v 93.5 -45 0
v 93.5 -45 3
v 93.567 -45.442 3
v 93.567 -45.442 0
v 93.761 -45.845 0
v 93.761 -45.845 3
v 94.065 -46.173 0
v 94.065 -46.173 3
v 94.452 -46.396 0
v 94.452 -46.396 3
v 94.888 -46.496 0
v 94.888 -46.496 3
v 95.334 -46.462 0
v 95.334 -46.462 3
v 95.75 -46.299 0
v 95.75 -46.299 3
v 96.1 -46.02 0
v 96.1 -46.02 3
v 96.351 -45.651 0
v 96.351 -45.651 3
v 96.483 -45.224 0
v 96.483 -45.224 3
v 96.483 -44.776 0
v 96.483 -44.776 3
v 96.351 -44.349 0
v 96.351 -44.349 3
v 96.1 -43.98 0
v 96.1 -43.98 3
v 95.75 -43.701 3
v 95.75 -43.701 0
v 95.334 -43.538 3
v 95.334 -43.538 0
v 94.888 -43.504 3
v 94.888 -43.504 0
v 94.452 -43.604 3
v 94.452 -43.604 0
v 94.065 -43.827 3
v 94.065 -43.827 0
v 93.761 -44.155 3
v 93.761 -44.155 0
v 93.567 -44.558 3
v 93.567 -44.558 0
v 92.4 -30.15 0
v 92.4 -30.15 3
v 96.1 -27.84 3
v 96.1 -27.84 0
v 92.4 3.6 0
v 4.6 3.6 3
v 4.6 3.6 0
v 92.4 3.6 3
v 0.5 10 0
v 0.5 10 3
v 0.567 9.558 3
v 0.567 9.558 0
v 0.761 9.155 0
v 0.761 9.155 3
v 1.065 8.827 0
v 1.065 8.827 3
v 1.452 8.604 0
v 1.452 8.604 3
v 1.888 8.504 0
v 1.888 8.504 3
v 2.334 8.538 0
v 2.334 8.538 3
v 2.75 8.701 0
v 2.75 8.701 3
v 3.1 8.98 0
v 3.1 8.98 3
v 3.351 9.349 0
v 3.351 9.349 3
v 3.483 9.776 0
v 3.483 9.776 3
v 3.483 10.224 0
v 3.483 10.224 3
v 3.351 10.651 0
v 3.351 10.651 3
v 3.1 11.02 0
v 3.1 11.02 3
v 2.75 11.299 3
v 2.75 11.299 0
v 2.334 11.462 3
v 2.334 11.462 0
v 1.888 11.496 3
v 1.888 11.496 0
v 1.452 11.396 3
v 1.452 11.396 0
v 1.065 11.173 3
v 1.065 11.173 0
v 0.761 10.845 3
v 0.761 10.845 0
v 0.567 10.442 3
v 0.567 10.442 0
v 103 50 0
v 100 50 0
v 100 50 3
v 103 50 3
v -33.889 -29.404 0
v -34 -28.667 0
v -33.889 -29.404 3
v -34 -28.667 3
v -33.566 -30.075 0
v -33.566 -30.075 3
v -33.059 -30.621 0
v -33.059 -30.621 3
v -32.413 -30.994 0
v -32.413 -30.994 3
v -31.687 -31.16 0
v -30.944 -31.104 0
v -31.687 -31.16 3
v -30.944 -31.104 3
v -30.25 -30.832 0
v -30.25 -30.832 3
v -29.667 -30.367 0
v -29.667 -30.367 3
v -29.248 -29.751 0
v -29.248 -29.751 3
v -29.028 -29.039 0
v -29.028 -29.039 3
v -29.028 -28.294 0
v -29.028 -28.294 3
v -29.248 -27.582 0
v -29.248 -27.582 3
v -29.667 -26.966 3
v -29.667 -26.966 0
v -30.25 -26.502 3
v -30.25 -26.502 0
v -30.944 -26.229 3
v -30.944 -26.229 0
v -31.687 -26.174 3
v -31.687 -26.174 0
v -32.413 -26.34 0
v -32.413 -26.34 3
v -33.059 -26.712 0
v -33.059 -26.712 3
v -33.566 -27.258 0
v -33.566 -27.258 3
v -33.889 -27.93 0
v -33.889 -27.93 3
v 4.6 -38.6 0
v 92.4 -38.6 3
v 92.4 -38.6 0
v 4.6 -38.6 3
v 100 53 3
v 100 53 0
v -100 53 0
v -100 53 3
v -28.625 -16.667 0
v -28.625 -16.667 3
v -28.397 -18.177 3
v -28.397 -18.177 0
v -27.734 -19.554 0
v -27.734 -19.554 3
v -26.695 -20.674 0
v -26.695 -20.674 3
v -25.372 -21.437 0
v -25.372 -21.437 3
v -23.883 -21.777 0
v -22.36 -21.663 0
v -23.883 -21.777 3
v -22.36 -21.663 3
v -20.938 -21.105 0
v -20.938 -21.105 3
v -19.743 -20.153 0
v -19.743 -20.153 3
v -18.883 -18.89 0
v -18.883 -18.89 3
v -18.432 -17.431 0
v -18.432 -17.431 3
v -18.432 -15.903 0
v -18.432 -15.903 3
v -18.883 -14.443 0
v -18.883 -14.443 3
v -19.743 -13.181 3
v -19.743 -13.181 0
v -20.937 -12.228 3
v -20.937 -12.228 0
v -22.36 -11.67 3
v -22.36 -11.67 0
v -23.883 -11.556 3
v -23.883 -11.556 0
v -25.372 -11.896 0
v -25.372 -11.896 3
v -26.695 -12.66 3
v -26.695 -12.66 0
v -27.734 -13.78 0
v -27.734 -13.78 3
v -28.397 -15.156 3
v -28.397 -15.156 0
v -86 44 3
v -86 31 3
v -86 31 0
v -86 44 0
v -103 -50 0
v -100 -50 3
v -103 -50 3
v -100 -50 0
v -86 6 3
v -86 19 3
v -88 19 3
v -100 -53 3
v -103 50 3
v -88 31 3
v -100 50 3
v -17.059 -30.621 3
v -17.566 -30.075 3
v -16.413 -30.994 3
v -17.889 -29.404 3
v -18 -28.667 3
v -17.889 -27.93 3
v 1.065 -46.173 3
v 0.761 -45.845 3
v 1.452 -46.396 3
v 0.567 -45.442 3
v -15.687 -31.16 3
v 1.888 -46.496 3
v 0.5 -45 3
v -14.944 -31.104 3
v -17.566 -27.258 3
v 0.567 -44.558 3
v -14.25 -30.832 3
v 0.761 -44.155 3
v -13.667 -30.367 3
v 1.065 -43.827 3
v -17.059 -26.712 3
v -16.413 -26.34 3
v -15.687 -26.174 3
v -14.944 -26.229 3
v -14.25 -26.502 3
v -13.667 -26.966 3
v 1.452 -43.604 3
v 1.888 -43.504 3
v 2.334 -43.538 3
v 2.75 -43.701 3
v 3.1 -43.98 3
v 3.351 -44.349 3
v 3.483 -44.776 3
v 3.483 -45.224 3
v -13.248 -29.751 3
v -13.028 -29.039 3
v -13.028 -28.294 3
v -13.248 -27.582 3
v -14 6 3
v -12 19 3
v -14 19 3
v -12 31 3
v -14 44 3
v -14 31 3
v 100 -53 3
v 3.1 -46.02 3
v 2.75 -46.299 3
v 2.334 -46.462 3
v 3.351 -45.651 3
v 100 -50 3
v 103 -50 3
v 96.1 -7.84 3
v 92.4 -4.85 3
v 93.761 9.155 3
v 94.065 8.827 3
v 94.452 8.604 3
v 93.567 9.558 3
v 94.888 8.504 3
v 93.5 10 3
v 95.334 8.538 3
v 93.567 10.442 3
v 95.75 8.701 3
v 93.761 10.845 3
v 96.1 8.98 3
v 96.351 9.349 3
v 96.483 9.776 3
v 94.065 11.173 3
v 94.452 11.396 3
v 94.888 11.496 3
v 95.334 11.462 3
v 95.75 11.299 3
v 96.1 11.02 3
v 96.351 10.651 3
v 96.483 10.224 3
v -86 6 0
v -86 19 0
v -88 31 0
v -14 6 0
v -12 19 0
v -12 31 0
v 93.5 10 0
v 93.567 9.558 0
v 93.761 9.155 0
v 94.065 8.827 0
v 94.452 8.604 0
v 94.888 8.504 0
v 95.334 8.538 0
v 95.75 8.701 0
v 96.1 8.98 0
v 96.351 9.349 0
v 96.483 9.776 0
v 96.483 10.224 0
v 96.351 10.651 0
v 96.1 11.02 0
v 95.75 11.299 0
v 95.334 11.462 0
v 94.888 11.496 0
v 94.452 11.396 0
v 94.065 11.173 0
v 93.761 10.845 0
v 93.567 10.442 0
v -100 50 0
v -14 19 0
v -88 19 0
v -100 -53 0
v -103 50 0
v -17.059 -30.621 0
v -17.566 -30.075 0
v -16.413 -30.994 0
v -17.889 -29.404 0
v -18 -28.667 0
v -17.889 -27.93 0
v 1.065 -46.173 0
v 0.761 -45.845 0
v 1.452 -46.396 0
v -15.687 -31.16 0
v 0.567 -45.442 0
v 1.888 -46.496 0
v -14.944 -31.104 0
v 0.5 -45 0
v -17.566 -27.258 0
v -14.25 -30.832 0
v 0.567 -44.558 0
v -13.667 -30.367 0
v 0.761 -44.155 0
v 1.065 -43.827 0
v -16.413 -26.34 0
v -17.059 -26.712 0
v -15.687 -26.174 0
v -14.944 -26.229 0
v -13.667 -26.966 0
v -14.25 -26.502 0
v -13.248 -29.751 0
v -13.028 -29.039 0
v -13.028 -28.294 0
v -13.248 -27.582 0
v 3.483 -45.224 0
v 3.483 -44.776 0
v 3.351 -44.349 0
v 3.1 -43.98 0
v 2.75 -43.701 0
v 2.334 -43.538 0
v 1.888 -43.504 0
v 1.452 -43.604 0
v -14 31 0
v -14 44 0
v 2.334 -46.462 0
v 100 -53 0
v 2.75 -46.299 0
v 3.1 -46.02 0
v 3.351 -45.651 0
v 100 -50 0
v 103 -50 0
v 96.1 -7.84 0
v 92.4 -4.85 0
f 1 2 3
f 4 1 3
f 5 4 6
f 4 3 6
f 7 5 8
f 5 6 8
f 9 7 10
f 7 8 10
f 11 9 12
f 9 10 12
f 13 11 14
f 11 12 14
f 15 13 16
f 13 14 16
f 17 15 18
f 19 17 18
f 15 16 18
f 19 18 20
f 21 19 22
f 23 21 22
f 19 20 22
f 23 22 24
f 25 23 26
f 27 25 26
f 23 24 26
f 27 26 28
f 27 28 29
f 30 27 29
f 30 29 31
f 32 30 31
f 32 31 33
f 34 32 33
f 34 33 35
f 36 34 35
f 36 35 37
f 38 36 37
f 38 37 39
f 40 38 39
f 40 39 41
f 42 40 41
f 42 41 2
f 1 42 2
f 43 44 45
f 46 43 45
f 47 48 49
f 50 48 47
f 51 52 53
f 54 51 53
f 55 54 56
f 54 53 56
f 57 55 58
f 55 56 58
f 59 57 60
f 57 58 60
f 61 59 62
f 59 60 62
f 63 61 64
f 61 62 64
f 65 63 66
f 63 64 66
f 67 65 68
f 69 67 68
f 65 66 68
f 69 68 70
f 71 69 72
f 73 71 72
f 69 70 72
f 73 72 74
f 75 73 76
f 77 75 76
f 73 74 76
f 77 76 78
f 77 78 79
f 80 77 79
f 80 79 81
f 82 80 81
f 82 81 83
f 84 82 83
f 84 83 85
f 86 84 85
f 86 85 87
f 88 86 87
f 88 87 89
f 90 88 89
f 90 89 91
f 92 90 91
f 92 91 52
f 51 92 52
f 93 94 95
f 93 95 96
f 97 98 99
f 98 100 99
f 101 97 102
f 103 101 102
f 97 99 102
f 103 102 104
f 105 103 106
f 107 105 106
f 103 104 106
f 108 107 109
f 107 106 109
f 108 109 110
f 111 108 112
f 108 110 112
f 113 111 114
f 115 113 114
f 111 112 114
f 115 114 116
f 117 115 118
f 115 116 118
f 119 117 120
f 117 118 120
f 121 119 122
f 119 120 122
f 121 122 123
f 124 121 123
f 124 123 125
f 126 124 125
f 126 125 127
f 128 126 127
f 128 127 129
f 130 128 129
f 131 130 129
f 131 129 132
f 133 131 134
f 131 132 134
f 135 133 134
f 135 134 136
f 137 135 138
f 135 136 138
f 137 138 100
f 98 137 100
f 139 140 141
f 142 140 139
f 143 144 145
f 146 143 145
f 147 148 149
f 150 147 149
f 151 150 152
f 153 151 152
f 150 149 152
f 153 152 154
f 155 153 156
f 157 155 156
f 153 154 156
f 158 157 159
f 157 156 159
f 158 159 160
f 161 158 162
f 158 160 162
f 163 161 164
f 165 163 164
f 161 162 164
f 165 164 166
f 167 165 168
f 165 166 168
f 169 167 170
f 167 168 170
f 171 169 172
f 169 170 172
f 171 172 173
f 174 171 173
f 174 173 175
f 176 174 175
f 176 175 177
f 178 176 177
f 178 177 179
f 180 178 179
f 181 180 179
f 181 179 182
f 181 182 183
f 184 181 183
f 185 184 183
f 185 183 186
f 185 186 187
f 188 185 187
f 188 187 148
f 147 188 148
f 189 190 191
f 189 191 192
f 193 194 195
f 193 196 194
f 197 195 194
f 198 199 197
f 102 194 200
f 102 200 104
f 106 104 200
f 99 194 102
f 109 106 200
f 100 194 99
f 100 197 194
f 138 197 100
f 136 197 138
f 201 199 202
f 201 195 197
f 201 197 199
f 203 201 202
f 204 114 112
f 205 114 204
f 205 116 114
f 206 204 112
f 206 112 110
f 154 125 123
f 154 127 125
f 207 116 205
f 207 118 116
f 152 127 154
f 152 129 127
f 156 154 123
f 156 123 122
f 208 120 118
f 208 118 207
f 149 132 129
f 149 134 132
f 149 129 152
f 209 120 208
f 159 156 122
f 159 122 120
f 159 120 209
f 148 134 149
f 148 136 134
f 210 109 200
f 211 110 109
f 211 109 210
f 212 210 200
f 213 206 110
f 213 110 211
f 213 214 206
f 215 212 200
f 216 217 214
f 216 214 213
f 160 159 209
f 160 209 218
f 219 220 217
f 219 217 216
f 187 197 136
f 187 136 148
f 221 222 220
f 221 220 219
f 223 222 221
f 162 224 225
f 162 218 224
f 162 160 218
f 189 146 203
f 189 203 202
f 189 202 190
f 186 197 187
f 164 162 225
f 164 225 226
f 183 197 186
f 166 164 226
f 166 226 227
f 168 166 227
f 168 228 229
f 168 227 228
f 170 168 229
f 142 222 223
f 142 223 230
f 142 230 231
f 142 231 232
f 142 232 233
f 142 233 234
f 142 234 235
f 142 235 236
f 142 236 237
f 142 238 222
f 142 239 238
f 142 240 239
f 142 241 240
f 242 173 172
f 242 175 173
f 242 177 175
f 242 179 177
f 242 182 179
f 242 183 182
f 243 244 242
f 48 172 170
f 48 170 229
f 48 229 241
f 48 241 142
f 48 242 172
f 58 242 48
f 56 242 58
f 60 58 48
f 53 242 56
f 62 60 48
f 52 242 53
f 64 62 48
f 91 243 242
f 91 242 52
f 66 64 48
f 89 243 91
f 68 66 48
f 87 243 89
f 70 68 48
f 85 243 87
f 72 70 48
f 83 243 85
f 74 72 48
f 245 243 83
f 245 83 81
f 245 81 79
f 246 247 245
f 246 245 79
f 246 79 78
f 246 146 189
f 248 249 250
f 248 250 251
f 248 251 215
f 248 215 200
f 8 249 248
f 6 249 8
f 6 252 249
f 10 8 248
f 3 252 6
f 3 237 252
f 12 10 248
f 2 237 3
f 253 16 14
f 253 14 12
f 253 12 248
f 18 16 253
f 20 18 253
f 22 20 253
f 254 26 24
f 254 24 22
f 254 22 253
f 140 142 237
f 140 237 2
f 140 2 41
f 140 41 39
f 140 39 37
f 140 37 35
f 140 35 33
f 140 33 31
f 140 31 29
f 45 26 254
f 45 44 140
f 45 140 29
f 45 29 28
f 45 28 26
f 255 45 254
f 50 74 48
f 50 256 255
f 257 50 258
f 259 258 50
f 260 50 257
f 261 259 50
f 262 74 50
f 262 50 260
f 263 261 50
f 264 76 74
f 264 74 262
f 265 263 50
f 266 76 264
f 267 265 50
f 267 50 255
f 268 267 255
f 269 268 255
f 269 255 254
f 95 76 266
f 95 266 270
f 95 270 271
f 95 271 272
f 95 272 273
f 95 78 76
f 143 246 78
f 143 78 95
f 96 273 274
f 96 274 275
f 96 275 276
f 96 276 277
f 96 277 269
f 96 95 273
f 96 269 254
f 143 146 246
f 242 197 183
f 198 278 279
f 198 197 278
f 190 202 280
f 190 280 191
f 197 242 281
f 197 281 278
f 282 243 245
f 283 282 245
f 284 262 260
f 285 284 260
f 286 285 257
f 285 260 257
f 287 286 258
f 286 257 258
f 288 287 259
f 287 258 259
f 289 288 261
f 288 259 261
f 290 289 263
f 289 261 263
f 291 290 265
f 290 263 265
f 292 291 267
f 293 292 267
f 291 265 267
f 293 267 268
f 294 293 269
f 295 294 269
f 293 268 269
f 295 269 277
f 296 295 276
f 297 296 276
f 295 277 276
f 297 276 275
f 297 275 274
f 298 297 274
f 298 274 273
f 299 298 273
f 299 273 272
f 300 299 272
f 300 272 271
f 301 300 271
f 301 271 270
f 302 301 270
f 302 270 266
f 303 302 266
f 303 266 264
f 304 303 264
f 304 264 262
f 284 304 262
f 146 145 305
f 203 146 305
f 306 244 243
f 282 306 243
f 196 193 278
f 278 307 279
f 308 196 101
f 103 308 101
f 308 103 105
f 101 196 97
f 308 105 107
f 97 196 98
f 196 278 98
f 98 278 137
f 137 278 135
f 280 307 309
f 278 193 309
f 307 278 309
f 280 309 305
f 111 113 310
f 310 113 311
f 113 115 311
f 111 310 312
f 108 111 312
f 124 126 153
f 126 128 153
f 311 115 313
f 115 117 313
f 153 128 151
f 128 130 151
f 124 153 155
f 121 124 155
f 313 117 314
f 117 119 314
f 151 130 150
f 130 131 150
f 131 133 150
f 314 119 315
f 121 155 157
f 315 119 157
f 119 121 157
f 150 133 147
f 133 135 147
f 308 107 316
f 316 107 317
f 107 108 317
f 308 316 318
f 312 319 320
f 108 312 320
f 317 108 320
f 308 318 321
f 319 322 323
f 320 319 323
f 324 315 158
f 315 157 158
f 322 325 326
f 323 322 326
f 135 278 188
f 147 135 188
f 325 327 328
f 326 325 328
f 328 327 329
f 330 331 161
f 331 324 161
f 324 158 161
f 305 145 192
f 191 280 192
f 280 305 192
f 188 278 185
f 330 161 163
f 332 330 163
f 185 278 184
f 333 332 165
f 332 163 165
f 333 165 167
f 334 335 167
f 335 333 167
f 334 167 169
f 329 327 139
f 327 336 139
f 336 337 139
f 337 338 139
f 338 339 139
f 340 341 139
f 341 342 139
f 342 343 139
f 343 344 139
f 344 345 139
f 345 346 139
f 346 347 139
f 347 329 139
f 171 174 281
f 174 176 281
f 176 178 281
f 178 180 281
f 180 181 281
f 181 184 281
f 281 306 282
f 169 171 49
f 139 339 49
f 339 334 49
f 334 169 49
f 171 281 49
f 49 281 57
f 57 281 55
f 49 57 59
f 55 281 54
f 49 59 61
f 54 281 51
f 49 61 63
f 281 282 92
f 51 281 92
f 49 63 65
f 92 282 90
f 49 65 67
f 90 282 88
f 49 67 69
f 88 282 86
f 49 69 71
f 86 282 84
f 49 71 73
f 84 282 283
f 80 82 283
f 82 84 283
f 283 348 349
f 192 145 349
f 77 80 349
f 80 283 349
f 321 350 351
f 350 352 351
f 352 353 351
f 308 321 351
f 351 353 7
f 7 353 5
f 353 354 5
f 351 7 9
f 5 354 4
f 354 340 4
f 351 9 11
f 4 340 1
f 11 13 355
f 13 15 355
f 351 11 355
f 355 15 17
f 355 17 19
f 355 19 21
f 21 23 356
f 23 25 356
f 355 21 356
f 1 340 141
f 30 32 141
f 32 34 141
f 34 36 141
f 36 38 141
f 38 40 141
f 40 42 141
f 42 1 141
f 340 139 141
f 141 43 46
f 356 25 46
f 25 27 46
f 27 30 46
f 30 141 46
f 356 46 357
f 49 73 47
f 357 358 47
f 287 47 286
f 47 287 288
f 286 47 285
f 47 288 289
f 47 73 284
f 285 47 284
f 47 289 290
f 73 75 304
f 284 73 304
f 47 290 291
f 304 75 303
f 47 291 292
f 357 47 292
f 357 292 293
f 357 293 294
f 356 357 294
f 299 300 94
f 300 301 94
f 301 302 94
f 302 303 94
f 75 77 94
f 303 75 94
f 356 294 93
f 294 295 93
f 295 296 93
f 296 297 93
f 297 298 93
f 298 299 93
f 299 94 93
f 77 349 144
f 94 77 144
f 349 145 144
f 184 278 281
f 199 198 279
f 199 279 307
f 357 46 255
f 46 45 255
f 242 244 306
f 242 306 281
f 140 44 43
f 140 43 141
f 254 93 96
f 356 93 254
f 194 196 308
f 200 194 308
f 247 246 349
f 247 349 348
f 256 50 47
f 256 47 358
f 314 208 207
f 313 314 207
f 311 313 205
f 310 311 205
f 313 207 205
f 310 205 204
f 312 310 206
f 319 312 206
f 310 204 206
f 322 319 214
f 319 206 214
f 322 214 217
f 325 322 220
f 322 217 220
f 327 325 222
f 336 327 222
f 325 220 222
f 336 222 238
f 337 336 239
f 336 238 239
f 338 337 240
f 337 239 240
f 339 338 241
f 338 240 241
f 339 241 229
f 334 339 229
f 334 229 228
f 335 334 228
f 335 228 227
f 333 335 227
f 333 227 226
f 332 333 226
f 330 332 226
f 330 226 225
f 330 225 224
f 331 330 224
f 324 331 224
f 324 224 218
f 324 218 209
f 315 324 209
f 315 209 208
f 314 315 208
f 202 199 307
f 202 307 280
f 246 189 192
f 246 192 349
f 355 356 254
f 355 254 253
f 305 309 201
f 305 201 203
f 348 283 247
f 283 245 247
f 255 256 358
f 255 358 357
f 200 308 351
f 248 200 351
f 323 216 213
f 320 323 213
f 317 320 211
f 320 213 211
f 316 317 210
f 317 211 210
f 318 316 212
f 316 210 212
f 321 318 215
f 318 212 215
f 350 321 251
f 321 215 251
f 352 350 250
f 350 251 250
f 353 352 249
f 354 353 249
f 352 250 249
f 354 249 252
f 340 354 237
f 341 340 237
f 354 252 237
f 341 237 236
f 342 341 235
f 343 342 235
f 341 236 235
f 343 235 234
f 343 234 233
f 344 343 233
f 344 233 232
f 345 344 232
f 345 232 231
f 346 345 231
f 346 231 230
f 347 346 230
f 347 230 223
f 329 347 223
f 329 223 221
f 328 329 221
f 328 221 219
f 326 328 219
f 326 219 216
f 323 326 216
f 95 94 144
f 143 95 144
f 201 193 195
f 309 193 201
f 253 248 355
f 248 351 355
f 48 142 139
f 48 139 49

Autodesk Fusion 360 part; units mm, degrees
sketch "Esquisse1" plane through (0, 0, 0) normal (0, 0, 1) x (1, 0, 0)
  line L0 (103, -50) -> (-103, -50)
  line L1 (-103, -50) -> (-103, 50)
  line L2 (-103, 50) -> (103, 50)
  line L3 (103, 50) -> (103, -50)
  line L4 (103, -50) -> (-103, 50) construction
  line L5 (-103, -50) -> (103, 50) construction
  line L6 (-100, -53) -> (100, -53)
  line L7 (100, -53) -> (100, 53)
  line L8 (100, 53) -> (-100, 53)
  line L9 (-100, 53) -> (-100, -53)
  line L10 (-100, -53) -> (100, 53) construction
  line L11 (100, -53) -> (-100, 53) construction
  dimension "d1" = 206
  dimension "d2" = 100
  dimension "d41" = 200
  dimension "d42" = 106
extrude "Extrusion1" add sketch "Esquisse1" along normal blind 3
sketch "Esquisse3" plane through (0, 0, 3) normal (0, 0, 1) x (-1, 0, 0)
  line L0 (100, -50) -> (103, -50)
  line L1 (103, -50) -> (103, 50)
  line L2 (103, 50) -> (100, 50)
  line L3 (-103, 50) -> (-103, -50)
  line L4 (-4.6, -3.6) -> (-92.4, -3.6)
  line L5 (-92.4, -3.6) -> (-92.4, 38.6)
  line L6 (-92.4, 38.6) -> (-4.6, 38.6)
  line L7 (-4.6, 38.6) -> (-4.6, -3.6)
  line L8 (-4.6, -3.6) -> (-92.4, 38.6) construction
  line L9 (-92.4, -3.6) -> (-4.6, 38.6) construction
  line L10 (-2, -10) -> (-95, -10)
  line L11 (-95, -10) -> (-95, 45)
  line L12 (-95, 45) -> (-2, 45)
  line L13 (-2, 45) -> (-2, -10)
  line L14 (-2, -10) -> (-95, 45) construction
  line L15 (-95, -10) -> (-2, 45) construction
  line L16 (103, 50) -> (103, -50)
  line L17 (-100, -50) -> (-100, -53)
  line L18 (-100, -53) -> (100, -53)
  line L19 (100, -53) -> (100, -50)
  line L20 (100, 50) -> (100, 53)
  line L21 (100, 53) -> (-100, 53)
  line L22 (-100, 53) -> (-100, 50)
  line L23 (-100, 50) -> (-103, 50)
  line L24 (-103, -50) -> (-100, -50)
  circle A0 centre (-2, 45) radius 1.5
  circle A1 centre (-95, 45) radius 1.5
  circle A2 centre (-95, -10) radius 1.5
  circle A3 centre (-2, -10) radius 1.5
  line L25 (15.5, 40.6667) -> (31.5, 40.6667)
  line L26 (35.5, 36.6667) -> (35.5, 12.6667)
  line L27 (31.5, 8.6667) -> (15.5, 8.6667)
  line L28 (11.5, 12.6667) -> (11.5, 36.6667)
  line L29 (11.5, 40.6667) -> (35.5, 8.6667) construction
  line L30 (35.5, 40.6667) -> (11.5, 8.6667) construction
  circle A4 centre (31.5, 28.6667) radius 2.5
  circle A5 centre (15.5, 28.6667) radius 2.5
  arc A6 (31.5, 8.6667) -> (35.5, 12.6667) centre (31.5, 12.6667) ccw
  arc A7 (11.5, 12.6667) -> (15.5, 8.6667) centre (15.5, 12.6667) ccw
  arc A8 (15.5, 40.6667) -> (11.5, 36.6667) centre (15.5, 36.6667) ccw
  arc A9 (35.5, 36.6667) -> (31.5, 40.6667) centre (31.5, 36.6667) ccw
  circle A10 centre (23.5, 16.6667) radius 5.125
  line L31 (100, 53) -> (-100, 53)
  line L32 (14, -6) -> (86, -6)
  line L33 (86, -6) -> (86, -44)
  line L34 (86, -44) -> (14, -44)
  line L35 (14, -44) -> (14, -6)
  line L36 (14, -6) -> (86, -44) construction
  line L37 (86, -6) -> (14, -44) construction
  line L38 (-92.4, 30.15) -> (-96.1, 30.15)
  line L39 (-96.1, 30.15) -> (-96.1, 4.85)
  line L40 (-96.1, 4.85) -> (-92.4, 4.85)
  line L41 (-92.4, 4.85) -> (-92.4, 30.15)
  line L42 (-92.4, 30.15) -> (-96.1, 4.85) construction
  line L43 (-96.1, 30.15) -> (-92.4, 4.85) construction
  line L44 (-92.4, 4.85) -> (-96.1, 7.8397)
  line L45 (-92.4, 30.15) -> (-96.1, 27.8397)
  line L46 (14, -19) -> (12, -19)
  line L47 (12, -19) -> (12, -31)
  line L48 (12, -31) -> (14, -31)
  line L49 (14, -31) -> (14, -19)
  line L50 (14, -19) -> (12, -31) construction
  line L51 (12, -19) -> (14, -31) construction
  line L52 (50, -25) -> (50, -44)
  line L53 (86, -19) -> (88, -19)
  line L54 (86, -31) -> (86, -19)
  line L55 (88, -31) -> (86, -31)
  line L56 (88, -19) -> (86, -31) construction
  line L57 (88, -19) -> (88, -31)
  line L58 (86, -19) -> (88, -31) construction
  point P0 (-48.5, 17.5)
  point P1 (-48.5, 17.5)
  point P2 (23.5, 24.6667)
  point P3 (50, -25)
  point P4 (-94.25, 17.5)
  point P5 (13, -25)
  point P6 (87, -25)
  dimension "d26" = 3
  dimension "d27" = 100
  dimension "d30" = 87.8
  dimension "d31" = 42.2
  dimension "d34" = 93
  dimension "d35" = 55
  dimension "d44" = 3
  dimension "d45" = 3
  dimension "d46" = 3
  dimension "d47" = 3
  dimension "d48" = 24
  dimension "d49" = 32
  dimension "d50" = 5
  dimension "d51" = 12
  dimension "d52" = 4
  dimension "d53" = 5
  dimension "d54" = 12
  dimension "d55" = 4
  dimension "d56" = 4
  dimension "d57" = 4
  dimension "d58" = 4
  dimension "d59" = 4
  dimension "d60" = 10.25
  dimension "d61" = 8
  dimension "d62" = 12
  dimension "d63" = 8
  dimension "d64" = 8
  dimension "d65" = 72
  dimension "d66" = 38
  dimension "d67" = 53
  dimension "d68" = 200
  dimension "d69" = 79.5
  dimension "d70" = 28
  dimension "d71" = 36.3333
  dimension "d72" = 25.3
  dimension "d73" = 3.7
  dimension "d74" = 21.1
  dimension "d75" = 20
  dimension "d76" = 12
  dimension "d77" = 2
  dimension "d78" = 19
extrude "Extrusion3" cut sketch "Esquisse3" against normal blind 3 contours L4 L5 L6 L7 L41 | L5 L11 L41 L44 L45 | L11 L39 L44 L45 | L10 L11 A2 | L10 L11 A2 | L11 L12 A1 | L11 L12 A1 | L10 L13 A3 | L10 L13 A3 | L12 L13 A0 | L12 L13 A0 | A4 | A5 | A10 | L32 L33 L34 L35 L49 L54 | L35 L46 L47 L48 L49 | L33 L53 L54 L55 L57
equation "d30 = 87.3 mm + 0.5 mm"
equation "d31 = 41.7 mm + 0.5 mm"
equation "d52 = ( d48 - 16 mm ) / 2"
equation "d54 = d51"
equation "d55 = d52"
equation "d57 = d56"
equation "d58 = d57"
equation "d59 = d56"
equation "d62 = d48 / 2"
equation "d67 = d68 / 4 + 3 mm"
equation "d69 = d67 * 3 / 2"
equation "d70 = d27 / 4 + 3 mm"
equation "d71 = d27 / 3 + 3 mm"
equation "d74 = d31 / 2"
equation "d78 = d66 / 2"
